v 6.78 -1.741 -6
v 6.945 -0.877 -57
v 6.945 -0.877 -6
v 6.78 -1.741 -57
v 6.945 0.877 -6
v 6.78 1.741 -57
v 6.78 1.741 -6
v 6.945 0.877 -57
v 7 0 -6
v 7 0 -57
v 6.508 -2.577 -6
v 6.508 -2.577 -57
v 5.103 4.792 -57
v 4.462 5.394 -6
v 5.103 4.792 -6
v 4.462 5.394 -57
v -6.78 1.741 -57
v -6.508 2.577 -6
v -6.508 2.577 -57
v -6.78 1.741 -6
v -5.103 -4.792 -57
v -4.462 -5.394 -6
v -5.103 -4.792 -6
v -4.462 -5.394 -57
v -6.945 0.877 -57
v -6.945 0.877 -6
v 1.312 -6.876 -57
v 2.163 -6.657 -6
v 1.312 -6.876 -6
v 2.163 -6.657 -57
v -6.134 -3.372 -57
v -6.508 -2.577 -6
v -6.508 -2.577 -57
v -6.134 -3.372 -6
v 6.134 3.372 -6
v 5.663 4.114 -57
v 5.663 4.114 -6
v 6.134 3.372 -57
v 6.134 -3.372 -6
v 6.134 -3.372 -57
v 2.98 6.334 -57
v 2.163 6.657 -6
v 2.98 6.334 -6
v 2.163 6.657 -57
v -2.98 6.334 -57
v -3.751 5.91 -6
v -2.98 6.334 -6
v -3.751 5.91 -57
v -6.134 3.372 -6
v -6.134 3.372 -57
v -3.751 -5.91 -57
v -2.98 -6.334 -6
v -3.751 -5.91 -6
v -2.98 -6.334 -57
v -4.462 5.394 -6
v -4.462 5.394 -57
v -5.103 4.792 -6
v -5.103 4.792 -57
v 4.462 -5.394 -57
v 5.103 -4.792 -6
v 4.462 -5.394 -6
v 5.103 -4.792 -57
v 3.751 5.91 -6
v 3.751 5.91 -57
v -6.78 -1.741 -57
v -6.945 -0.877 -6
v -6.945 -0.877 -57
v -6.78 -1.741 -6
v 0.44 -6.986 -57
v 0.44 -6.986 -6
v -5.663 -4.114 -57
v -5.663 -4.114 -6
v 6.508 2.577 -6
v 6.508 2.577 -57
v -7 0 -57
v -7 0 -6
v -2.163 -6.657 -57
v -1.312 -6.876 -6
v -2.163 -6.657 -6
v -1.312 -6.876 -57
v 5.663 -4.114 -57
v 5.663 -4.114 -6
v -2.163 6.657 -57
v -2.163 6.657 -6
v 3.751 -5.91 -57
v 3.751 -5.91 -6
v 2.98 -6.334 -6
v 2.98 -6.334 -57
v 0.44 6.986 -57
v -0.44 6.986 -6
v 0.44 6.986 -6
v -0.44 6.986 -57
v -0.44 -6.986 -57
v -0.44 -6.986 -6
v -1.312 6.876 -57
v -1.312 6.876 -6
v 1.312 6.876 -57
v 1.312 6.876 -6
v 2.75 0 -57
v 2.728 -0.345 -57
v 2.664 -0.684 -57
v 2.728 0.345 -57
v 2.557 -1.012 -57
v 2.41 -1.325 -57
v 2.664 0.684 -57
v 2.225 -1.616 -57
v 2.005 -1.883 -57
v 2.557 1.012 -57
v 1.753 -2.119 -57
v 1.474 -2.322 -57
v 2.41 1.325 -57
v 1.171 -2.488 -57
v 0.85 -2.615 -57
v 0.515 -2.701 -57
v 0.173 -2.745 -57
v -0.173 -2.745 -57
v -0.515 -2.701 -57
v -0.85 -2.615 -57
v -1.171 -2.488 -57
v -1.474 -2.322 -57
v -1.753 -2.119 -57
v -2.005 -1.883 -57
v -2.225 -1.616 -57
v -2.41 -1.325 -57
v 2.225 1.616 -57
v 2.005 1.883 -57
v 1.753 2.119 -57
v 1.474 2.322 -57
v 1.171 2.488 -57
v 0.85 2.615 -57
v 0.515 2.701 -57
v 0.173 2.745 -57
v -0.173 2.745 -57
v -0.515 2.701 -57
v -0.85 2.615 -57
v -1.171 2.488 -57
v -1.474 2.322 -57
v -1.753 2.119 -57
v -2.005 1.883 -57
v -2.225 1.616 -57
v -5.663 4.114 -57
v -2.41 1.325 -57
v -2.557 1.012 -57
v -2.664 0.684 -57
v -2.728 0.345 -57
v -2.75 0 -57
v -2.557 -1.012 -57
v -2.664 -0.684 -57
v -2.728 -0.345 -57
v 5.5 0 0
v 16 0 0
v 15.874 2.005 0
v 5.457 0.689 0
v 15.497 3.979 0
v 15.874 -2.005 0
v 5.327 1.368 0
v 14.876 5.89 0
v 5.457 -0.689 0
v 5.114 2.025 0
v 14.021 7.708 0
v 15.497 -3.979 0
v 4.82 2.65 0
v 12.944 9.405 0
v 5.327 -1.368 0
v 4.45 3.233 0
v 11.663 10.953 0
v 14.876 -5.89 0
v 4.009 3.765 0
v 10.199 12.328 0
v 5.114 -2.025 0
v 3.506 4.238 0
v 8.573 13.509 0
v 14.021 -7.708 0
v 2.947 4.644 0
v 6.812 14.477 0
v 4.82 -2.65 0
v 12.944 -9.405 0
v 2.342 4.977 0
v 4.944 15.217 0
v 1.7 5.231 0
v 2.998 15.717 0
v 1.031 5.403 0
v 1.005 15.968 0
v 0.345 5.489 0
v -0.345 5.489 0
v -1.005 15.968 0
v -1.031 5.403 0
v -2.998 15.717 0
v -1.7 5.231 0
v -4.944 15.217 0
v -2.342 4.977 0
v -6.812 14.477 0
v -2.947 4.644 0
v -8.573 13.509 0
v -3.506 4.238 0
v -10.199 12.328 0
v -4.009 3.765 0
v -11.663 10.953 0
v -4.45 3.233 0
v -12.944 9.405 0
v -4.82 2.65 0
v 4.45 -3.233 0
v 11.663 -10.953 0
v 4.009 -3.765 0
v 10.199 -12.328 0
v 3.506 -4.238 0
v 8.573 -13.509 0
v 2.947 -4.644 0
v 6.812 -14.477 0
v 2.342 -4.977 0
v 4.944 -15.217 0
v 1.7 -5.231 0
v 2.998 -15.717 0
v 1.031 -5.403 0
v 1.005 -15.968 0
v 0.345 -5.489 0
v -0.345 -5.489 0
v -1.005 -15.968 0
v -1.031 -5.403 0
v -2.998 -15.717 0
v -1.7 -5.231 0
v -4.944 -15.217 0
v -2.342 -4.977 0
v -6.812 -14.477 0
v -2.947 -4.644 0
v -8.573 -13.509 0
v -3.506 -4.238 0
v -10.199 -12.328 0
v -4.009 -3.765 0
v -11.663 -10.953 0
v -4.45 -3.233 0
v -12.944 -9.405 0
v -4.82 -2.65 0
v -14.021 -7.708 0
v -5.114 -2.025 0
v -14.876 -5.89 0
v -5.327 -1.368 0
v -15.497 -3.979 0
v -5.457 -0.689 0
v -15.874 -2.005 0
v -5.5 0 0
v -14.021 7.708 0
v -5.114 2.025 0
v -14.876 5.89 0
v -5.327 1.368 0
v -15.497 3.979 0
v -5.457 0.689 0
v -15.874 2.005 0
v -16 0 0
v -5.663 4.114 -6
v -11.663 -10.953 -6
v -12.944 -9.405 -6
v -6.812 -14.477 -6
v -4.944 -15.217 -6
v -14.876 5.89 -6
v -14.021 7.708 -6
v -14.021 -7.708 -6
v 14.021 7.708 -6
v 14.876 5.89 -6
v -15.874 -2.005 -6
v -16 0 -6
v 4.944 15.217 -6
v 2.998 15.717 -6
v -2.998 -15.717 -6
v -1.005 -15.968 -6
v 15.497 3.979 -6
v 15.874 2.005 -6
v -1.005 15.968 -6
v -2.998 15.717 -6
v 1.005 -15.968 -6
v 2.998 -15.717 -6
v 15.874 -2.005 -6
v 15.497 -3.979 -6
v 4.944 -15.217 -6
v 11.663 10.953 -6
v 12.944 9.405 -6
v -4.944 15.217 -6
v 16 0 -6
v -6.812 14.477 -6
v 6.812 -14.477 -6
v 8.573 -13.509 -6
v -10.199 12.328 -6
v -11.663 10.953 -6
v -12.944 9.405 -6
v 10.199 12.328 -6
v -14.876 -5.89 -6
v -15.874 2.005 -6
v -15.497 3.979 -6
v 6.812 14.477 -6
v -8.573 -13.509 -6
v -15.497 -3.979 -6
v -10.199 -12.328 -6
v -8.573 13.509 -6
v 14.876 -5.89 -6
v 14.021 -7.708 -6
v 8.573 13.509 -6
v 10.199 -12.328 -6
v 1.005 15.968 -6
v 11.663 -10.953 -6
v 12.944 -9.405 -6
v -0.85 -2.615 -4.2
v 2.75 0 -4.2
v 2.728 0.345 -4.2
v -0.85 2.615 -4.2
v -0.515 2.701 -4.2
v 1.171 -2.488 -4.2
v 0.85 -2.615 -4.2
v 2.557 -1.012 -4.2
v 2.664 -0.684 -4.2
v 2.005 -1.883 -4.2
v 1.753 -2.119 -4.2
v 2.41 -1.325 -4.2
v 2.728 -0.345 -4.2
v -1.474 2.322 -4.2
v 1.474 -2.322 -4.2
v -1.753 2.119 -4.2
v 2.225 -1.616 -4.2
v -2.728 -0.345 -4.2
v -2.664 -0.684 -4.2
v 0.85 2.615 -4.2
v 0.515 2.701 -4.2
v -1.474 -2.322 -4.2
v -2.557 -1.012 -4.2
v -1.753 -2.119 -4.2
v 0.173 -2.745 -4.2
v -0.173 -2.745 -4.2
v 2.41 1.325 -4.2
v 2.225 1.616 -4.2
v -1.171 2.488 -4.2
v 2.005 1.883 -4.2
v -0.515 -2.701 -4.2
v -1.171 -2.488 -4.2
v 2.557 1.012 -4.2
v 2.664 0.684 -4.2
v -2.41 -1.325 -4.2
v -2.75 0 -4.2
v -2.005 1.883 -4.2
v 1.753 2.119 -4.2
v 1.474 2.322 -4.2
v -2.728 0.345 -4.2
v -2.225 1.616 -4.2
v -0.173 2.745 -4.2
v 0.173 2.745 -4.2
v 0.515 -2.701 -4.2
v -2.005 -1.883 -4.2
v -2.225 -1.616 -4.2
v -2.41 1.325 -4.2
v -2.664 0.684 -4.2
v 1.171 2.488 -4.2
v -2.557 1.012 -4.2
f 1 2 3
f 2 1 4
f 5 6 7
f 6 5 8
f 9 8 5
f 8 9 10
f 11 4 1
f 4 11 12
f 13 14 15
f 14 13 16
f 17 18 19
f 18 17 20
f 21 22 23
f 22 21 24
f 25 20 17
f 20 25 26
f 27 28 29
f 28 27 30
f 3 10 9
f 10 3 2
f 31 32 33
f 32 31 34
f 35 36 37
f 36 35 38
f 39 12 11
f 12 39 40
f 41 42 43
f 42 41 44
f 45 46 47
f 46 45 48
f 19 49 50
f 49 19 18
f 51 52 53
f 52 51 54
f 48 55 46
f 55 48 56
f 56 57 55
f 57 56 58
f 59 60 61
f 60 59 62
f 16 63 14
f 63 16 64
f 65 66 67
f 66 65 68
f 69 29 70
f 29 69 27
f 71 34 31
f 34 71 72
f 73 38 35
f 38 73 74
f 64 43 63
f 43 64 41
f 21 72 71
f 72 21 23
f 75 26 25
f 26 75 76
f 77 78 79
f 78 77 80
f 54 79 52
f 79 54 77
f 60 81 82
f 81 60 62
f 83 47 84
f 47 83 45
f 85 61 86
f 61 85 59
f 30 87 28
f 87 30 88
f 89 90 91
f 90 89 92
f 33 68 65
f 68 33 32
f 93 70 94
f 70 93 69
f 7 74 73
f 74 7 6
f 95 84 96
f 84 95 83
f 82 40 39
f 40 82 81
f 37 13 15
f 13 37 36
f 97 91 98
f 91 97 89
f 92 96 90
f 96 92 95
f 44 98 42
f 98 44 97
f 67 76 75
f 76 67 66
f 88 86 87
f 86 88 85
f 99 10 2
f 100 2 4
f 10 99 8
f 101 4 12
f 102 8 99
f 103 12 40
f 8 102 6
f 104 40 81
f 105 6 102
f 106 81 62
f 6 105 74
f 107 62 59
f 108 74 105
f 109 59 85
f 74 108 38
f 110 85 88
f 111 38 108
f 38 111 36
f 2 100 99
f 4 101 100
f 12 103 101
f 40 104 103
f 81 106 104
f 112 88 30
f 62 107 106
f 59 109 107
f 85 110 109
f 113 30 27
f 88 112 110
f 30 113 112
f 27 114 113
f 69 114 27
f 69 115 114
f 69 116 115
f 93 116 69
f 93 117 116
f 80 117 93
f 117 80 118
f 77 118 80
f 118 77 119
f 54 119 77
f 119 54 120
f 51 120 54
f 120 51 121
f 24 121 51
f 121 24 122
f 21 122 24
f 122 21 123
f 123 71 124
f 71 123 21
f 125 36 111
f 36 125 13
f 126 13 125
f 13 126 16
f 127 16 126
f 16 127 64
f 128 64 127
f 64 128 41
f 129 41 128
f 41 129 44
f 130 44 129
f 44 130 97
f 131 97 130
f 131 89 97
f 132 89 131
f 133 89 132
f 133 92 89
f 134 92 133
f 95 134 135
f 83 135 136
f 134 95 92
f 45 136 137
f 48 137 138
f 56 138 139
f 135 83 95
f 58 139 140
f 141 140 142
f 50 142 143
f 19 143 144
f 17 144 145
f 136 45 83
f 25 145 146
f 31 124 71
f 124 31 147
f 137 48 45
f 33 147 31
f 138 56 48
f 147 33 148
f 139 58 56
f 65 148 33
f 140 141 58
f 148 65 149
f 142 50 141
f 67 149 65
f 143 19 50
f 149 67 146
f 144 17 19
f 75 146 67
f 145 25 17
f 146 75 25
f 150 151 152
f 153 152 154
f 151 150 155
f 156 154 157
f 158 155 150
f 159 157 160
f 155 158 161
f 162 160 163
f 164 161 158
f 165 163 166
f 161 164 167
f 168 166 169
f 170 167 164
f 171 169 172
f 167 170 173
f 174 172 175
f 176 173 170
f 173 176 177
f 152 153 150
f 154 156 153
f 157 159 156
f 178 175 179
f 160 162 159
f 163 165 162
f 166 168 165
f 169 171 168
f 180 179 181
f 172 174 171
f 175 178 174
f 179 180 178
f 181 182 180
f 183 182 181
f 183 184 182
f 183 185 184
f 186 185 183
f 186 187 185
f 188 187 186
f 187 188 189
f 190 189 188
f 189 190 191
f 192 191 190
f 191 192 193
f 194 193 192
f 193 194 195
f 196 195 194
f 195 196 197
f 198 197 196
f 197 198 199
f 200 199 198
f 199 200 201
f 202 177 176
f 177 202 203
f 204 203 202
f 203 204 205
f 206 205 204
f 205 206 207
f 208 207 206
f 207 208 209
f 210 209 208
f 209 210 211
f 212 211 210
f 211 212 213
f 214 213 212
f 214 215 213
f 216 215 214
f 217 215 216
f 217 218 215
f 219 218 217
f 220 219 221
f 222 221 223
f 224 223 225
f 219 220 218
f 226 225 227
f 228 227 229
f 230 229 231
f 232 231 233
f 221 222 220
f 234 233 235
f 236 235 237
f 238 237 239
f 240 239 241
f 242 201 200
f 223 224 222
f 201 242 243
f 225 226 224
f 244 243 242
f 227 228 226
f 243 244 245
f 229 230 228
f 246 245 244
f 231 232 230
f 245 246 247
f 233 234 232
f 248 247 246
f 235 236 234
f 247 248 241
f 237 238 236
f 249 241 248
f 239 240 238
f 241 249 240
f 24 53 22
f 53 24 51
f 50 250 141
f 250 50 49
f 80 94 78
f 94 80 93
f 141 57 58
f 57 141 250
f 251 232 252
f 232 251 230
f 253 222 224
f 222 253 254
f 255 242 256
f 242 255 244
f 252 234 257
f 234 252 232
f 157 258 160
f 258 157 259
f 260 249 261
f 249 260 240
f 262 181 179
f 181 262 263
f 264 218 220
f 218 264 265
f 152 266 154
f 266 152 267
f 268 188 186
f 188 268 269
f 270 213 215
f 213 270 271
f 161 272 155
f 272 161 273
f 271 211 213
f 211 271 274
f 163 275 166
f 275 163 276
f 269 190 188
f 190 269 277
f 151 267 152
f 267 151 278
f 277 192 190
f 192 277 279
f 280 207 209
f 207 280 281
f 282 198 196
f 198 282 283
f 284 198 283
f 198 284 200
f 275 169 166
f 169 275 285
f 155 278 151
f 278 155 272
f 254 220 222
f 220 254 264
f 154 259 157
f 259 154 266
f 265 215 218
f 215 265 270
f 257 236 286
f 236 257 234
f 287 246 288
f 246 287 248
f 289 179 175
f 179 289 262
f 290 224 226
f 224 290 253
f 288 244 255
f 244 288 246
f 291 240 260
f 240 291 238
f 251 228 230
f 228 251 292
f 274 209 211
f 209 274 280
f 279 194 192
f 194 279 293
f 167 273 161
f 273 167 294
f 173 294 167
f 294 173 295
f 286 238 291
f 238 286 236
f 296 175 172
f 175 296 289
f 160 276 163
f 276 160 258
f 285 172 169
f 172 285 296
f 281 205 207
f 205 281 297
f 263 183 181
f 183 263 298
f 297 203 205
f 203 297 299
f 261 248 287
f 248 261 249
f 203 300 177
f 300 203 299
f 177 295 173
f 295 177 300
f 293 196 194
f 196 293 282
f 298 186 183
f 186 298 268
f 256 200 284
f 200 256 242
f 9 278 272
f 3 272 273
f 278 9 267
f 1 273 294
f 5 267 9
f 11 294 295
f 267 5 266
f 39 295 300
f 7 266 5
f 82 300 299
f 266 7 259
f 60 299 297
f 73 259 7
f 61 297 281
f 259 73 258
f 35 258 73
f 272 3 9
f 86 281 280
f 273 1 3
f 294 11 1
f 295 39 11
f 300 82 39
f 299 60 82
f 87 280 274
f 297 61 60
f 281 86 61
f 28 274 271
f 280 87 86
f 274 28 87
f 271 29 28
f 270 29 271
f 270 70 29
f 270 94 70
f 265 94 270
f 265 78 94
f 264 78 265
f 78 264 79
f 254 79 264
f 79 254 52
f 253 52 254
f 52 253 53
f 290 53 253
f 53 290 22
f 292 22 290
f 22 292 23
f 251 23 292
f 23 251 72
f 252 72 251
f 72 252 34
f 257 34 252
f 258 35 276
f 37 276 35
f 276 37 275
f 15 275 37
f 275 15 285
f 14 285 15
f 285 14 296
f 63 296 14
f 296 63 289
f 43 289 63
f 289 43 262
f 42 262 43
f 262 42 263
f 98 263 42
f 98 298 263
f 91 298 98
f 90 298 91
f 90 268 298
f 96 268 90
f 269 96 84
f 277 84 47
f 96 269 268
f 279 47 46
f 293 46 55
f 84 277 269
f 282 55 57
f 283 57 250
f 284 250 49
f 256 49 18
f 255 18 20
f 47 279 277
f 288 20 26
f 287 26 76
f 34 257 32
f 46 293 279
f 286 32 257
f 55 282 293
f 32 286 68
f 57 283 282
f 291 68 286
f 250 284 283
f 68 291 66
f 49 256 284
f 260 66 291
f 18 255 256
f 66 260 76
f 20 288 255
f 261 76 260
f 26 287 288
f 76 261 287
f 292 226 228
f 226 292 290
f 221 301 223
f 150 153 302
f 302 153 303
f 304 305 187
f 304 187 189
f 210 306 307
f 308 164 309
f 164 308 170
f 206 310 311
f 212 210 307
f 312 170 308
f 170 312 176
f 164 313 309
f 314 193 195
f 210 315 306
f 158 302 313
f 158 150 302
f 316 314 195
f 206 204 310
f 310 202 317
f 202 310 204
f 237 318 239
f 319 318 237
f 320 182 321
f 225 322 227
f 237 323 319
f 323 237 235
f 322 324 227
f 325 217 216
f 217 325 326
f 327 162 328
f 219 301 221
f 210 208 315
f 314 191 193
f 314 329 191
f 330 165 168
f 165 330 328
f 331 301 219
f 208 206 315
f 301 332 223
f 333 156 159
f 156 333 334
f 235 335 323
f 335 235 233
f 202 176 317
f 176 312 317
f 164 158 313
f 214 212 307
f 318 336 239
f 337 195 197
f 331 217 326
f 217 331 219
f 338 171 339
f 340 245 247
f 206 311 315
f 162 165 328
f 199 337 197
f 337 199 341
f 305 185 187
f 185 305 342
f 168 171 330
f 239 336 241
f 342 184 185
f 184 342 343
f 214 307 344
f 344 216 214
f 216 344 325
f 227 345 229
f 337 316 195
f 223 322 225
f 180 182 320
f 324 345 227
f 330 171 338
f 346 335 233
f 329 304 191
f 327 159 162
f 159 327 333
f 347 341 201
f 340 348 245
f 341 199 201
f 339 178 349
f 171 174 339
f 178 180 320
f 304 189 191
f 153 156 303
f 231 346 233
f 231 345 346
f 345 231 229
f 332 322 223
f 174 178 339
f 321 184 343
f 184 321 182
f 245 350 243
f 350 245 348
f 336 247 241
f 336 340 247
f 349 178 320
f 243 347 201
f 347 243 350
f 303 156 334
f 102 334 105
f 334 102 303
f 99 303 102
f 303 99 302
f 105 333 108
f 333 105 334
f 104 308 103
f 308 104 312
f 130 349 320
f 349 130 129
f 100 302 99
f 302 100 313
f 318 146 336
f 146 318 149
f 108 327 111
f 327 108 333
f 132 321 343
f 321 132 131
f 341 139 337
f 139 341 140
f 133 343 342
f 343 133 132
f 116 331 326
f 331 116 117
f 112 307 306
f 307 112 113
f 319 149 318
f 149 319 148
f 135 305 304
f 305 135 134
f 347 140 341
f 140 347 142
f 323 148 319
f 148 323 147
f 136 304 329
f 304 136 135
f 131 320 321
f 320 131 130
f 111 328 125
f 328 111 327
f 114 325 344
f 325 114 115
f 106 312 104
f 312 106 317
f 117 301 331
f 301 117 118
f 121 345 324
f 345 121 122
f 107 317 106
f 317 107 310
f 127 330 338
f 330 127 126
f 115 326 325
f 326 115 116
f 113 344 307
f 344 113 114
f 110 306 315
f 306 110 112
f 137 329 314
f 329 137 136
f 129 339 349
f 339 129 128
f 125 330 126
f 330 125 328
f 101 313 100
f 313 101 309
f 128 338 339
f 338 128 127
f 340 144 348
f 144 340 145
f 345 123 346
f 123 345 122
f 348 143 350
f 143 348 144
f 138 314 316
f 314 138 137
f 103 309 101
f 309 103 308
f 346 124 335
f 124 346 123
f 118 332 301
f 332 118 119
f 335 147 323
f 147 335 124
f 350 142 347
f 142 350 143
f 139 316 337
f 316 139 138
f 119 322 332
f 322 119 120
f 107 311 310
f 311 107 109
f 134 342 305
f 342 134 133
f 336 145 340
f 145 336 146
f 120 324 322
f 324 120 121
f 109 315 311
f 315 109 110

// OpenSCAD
$fn = 50;


difference() {
	union() {
		translate(v = [0, 0, -57.0000000000]) {
			cylinder(h = 57, r = 7.0000000000);
		}
		translate(v = [0, 0, -6.0000000000]) {
			cylinder(h = 6, r = 16.0000000000);
		}
	}
	union() {
		translate(v = [0, 0, 0]) {
			rotate(a = [0, 0, 0]) {
				difference() {
					union() {
						#translate(v = [0, 0, -57.0000000000]) {
							cylinder(h = 57, r = 2.2500000000);
						}
						#translate(v = [0, 0, -4.2000000000]) {
							cylinder(h = 4.2000000000, r = 7.0000000000, r1 = 2.7500000000, r2 = 5.5000000000);
						}
						#translate(v = [0, 0, -57.0000000000]) {
							cylinder(h = 57, r = 2.7500000000);
						}
						#translate(v = [0, 0, -57.0000000000]) {
							cylinder(h = 57, r = 2.2500000000);
						}
					}
					union();
				}
			}
		}
	}
}
